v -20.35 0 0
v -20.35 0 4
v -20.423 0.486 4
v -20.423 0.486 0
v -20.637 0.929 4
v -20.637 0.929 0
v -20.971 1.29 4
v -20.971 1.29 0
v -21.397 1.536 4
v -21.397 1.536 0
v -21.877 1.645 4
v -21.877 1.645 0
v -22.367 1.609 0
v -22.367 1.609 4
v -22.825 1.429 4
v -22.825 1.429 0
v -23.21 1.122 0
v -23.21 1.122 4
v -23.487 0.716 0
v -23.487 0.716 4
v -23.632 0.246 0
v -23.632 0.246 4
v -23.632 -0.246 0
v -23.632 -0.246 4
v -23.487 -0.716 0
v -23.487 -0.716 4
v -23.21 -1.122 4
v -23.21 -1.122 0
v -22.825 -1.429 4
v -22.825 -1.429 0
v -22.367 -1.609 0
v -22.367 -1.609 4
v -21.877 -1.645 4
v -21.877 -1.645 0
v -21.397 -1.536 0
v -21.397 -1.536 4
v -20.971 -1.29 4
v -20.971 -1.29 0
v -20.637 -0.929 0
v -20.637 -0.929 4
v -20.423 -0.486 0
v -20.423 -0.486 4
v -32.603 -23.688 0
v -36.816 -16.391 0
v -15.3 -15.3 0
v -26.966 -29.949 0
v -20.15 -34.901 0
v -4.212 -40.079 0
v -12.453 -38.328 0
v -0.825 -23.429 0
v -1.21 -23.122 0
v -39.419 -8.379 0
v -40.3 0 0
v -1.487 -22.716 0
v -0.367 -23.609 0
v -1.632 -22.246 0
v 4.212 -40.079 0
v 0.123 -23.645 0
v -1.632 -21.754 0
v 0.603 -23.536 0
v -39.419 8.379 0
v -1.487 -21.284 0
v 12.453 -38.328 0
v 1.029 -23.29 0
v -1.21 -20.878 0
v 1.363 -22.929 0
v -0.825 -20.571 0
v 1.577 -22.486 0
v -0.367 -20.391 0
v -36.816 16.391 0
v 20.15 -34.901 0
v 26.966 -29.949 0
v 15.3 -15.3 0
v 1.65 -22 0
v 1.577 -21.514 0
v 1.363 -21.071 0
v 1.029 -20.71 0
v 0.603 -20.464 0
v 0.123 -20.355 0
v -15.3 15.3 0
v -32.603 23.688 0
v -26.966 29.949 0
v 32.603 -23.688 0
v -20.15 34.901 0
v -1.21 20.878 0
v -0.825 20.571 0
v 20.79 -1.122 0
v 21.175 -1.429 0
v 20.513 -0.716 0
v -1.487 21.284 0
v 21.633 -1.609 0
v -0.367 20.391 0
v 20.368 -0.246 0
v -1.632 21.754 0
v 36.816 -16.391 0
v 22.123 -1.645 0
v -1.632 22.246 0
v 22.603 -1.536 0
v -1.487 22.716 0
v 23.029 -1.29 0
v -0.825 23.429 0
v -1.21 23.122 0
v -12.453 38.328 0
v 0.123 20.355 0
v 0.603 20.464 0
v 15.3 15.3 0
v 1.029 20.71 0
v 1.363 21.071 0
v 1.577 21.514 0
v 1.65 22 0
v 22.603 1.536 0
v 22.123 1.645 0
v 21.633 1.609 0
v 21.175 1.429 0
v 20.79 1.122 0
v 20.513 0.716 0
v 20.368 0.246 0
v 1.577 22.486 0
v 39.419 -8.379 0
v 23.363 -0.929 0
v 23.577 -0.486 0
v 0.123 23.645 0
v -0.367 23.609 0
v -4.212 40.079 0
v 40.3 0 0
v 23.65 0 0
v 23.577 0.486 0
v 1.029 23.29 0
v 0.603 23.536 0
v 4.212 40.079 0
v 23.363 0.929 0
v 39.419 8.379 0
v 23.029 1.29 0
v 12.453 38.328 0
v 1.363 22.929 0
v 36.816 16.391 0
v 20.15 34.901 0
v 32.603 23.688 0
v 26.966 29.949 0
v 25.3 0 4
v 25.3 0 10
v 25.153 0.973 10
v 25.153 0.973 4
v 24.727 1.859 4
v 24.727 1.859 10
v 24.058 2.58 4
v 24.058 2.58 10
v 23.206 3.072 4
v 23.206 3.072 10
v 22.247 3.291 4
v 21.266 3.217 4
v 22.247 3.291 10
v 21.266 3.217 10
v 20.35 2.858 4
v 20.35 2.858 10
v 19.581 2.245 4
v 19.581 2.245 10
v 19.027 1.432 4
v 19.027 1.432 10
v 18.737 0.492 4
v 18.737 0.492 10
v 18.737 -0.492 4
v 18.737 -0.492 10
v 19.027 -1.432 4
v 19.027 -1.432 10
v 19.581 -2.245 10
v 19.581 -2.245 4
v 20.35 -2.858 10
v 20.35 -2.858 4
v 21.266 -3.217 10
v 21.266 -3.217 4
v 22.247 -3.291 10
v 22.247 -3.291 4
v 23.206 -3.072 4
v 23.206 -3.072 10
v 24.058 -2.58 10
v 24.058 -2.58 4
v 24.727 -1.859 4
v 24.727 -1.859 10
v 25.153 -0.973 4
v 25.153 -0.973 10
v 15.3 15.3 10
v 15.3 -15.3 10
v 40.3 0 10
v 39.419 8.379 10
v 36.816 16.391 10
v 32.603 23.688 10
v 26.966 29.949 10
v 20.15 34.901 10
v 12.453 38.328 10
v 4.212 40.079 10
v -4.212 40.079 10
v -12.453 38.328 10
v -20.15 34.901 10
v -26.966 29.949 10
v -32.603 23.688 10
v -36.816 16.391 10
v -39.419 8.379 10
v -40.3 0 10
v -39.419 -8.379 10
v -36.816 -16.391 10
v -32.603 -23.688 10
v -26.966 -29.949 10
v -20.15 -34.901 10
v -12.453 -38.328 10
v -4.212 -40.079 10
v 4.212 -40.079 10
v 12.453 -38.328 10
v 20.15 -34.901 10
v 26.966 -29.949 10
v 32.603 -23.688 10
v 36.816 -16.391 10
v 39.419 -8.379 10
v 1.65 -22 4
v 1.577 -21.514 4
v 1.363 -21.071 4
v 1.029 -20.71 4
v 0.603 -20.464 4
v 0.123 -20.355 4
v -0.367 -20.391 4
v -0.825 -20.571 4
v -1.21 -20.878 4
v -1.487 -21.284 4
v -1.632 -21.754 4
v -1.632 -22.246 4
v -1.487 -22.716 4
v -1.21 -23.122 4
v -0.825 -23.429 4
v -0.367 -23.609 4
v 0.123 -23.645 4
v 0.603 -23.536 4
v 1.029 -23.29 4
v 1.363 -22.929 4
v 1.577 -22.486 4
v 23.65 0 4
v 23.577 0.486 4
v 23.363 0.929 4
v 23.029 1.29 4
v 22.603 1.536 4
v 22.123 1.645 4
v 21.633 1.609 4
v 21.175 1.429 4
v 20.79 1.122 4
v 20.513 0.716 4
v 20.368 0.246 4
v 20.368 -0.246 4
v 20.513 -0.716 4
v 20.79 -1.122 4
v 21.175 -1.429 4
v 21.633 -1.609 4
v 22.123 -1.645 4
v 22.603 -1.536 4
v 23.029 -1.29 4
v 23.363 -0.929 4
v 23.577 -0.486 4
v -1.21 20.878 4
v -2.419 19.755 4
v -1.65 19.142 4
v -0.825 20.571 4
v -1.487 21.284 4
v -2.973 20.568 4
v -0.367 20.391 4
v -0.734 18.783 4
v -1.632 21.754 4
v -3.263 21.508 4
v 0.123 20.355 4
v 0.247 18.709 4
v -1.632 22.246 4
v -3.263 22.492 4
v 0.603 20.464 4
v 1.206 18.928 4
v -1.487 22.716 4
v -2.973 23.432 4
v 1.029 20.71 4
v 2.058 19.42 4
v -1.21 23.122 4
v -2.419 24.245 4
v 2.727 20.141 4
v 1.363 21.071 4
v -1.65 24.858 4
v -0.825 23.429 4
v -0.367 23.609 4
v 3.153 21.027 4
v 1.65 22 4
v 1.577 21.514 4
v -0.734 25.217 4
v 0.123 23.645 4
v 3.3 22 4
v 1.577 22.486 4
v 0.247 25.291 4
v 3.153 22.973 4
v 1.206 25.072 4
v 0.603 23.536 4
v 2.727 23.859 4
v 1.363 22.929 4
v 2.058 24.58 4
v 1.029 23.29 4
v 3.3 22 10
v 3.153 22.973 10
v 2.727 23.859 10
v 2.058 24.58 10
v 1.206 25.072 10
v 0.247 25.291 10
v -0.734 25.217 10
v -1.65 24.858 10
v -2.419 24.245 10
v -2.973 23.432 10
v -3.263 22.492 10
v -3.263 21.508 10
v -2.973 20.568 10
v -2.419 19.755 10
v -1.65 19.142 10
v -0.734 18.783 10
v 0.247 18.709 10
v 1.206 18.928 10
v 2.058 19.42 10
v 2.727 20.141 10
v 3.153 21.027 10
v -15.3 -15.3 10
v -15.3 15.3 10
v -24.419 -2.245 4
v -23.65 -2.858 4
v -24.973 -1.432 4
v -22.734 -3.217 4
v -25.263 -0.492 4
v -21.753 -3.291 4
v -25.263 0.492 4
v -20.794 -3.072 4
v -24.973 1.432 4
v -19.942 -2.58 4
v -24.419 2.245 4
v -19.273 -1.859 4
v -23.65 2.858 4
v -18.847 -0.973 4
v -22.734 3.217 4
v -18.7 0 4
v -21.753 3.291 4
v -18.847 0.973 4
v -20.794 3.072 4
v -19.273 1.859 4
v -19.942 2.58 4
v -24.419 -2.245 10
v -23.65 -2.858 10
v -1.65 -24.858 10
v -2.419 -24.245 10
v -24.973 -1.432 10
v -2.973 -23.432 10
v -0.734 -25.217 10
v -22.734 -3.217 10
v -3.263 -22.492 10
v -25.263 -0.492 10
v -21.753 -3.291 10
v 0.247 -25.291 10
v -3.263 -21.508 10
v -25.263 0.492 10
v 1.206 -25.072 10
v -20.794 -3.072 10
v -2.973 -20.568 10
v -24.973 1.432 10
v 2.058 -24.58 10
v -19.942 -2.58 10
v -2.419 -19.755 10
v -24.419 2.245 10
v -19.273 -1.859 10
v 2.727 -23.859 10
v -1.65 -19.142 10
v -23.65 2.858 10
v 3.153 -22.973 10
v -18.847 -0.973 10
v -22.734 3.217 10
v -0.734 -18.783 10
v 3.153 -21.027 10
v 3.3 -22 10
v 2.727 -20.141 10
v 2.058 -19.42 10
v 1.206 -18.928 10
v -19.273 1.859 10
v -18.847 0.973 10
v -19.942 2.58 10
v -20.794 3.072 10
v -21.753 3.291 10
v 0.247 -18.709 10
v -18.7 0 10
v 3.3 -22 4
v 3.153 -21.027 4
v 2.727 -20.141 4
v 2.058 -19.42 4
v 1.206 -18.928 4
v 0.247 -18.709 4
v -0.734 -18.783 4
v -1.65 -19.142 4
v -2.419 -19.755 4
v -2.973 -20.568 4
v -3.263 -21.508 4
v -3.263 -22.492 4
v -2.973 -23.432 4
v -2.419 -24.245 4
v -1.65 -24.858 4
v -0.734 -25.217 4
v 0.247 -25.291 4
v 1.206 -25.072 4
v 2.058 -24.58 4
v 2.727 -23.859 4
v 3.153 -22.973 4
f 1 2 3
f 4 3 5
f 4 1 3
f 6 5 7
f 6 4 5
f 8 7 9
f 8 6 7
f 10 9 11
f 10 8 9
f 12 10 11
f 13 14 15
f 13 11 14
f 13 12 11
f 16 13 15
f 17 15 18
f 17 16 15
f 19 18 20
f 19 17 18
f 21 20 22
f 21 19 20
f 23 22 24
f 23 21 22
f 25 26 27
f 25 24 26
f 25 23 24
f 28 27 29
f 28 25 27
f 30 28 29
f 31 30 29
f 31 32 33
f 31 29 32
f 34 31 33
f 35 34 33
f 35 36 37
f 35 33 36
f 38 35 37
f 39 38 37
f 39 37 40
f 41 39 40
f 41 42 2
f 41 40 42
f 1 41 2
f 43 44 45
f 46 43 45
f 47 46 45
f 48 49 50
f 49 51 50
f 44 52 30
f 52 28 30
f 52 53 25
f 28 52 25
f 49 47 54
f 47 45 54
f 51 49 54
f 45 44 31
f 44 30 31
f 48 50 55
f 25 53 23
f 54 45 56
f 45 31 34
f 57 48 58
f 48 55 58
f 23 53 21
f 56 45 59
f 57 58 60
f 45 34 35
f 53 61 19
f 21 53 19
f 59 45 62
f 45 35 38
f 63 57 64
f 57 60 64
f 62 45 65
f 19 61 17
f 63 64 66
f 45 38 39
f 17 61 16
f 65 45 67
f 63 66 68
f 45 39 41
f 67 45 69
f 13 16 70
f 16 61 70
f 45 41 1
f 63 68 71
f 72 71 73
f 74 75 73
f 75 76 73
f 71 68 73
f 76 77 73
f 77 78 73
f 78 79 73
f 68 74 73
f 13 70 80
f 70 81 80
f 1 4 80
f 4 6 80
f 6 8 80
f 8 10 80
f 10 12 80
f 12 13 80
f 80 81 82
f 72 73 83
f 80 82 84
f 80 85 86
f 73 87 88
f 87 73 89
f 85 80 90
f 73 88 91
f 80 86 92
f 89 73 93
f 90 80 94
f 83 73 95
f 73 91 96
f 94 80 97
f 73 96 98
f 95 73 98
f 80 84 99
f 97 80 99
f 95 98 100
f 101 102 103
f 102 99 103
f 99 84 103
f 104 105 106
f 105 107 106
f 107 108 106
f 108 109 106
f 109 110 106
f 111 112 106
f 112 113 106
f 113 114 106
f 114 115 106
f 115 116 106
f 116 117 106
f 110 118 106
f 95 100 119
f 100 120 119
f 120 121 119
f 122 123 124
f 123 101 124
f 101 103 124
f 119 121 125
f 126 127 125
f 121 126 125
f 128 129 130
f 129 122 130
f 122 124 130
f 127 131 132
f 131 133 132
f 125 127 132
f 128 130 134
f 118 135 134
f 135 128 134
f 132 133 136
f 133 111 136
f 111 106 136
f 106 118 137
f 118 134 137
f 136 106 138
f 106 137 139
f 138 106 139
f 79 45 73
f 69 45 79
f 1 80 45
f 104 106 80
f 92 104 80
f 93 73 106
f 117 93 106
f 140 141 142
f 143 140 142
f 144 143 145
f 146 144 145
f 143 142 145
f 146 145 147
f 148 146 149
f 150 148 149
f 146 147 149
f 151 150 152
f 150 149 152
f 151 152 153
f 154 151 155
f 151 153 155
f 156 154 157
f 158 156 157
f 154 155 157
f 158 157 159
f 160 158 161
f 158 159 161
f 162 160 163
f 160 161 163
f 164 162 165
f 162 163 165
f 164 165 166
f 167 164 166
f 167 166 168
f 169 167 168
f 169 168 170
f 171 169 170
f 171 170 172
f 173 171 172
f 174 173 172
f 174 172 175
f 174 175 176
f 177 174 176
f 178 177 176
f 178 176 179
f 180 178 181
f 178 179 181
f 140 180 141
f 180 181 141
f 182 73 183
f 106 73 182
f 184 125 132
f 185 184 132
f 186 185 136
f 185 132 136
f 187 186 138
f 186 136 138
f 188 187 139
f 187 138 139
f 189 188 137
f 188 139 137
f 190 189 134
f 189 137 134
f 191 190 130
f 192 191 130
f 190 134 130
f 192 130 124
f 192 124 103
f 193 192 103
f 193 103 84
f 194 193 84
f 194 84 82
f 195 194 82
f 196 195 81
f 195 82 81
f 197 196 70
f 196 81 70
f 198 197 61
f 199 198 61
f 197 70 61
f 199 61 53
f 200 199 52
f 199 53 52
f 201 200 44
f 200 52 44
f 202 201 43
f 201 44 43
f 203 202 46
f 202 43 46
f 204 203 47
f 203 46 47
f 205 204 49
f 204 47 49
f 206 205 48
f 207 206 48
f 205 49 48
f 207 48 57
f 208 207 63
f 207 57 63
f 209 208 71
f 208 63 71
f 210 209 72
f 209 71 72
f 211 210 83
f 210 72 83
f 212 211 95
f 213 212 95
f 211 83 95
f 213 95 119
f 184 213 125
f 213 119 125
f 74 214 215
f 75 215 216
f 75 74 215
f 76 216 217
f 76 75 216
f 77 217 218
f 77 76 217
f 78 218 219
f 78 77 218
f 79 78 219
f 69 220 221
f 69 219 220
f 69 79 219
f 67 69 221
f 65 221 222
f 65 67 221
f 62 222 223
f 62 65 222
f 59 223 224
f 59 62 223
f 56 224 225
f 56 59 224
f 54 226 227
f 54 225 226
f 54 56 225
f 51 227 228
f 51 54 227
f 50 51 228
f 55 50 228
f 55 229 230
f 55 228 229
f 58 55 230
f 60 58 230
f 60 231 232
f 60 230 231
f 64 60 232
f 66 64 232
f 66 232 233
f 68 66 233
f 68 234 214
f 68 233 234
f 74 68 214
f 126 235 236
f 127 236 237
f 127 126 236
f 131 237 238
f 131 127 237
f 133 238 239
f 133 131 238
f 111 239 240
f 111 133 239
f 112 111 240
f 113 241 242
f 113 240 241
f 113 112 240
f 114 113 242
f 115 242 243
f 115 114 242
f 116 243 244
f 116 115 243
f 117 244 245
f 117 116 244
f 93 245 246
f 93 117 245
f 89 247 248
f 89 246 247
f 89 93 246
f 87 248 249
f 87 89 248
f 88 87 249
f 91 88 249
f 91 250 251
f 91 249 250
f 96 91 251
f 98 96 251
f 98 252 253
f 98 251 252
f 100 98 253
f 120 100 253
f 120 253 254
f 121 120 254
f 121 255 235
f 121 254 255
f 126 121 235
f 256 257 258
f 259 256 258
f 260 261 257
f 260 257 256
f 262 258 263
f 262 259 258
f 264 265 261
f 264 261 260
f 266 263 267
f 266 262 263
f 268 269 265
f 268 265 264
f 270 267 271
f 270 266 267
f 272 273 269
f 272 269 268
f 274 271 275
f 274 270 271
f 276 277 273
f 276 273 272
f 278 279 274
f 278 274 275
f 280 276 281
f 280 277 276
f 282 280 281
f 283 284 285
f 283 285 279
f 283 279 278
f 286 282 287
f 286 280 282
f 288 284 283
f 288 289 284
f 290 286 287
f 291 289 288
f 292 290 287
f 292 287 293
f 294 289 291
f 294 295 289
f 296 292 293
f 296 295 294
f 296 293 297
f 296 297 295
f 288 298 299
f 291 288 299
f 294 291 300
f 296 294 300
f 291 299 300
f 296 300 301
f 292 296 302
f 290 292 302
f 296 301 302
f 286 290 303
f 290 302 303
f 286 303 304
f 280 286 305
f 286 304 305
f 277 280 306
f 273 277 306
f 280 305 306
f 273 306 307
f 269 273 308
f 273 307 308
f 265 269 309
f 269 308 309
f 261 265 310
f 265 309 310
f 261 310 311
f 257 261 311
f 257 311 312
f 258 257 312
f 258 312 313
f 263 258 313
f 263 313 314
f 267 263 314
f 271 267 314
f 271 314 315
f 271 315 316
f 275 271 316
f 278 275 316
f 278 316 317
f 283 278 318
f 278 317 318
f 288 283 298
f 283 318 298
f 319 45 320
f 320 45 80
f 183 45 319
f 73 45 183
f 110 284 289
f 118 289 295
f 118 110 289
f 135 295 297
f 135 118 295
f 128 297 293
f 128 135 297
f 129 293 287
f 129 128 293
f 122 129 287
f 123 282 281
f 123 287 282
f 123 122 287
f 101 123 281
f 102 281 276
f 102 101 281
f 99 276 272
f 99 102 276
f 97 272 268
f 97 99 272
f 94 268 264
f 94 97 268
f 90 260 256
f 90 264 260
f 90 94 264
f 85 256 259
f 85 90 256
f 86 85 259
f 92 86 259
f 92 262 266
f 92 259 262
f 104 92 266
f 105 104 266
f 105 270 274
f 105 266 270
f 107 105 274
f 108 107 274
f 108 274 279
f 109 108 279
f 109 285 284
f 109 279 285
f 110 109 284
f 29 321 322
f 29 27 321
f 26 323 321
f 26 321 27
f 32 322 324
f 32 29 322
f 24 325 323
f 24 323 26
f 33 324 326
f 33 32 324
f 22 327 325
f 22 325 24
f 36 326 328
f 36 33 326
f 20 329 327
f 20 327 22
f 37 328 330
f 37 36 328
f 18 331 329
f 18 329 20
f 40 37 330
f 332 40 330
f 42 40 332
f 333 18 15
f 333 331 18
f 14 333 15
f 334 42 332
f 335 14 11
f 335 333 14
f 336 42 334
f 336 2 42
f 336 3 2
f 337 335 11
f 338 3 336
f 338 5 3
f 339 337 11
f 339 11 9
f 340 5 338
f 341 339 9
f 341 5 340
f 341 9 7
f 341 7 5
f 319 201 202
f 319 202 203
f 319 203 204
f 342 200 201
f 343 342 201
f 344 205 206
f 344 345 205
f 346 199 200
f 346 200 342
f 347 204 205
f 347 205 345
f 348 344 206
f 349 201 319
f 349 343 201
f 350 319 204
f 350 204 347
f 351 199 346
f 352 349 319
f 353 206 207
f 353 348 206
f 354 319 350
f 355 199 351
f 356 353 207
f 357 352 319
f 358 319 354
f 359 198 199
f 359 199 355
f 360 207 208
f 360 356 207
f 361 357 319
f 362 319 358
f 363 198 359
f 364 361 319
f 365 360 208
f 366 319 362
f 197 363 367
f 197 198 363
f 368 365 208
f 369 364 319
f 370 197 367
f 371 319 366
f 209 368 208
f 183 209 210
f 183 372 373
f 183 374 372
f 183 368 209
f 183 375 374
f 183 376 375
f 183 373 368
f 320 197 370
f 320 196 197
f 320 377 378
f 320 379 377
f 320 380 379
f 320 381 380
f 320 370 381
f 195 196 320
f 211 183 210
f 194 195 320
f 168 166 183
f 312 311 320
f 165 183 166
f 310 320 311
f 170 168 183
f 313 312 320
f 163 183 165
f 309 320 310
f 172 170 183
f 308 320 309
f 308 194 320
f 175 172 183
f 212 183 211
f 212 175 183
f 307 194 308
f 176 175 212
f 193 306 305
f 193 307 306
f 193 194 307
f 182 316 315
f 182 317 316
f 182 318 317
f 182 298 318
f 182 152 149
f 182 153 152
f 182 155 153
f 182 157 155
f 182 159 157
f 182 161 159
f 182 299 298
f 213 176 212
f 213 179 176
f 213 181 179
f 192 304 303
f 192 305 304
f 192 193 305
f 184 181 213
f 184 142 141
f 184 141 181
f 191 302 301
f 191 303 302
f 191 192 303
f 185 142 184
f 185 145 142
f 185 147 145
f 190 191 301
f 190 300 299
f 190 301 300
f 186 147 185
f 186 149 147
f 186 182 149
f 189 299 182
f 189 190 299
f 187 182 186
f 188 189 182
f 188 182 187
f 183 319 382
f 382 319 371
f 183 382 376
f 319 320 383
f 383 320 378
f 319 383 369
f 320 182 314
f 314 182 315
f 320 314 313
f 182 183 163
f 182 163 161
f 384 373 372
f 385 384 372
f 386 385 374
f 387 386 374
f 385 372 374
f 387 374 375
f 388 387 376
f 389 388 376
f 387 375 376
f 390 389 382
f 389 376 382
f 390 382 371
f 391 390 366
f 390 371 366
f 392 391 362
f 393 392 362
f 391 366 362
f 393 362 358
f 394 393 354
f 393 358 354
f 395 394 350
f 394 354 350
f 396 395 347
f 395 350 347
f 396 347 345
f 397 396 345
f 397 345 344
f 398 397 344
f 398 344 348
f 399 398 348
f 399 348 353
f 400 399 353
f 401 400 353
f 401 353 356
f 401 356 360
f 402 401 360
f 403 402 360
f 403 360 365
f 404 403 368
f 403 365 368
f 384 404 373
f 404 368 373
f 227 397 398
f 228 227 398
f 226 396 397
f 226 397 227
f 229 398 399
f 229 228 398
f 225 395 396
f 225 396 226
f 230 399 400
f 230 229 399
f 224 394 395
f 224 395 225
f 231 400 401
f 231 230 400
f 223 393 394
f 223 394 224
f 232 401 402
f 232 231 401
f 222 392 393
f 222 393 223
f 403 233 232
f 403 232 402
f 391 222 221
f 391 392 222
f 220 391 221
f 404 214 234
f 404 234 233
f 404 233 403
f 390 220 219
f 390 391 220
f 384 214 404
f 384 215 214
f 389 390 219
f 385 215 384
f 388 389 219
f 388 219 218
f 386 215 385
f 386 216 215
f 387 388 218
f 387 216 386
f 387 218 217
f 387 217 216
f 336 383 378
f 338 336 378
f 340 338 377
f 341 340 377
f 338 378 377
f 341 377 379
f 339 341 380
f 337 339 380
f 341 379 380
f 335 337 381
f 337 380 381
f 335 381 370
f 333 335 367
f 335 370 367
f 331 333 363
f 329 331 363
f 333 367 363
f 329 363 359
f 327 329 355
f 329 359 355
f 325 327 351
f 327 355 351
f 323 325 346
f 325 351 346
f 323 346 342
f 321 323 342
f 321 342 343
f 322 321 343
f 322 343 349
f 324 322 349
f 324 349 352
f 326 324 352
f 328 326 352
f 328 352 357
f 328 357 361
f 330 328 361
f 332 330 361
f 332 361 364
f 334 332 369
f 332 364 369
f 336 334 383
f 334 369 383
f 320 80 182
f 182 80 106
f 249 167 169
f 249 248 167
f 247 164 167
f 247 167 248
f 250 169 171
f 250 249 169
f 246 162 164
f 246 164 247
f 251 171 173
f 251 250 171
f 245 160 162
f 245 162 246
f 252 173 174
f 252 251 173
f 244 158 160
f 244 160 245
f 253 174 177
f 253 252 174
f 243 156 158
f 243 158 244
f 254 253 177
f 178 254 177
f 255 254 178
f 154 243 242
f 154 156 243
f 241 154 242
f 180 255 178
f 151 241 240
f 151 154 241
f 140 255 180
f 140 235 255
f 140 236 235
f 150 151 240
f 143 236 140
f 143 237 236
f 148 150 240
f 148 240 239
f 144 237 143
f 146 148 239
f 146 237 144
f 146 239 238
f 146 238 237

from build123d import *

# Parameters (mm, degrees)
SKETCH1_R           = 40.3
SKETCH1_R_2         = 1.65
SKETCH1_W           = 30.6
SKETCH1_H           = 30.6
BOSS_EXTRUDE1_DEPTH = 10
SKETCH2_R           = 3.3
CUT_EXTRUDE1_DEPTH  = 6


with BuildPart() as part:
    # Sketch1 → Boss-Extrude1 (new body)
    with BuildSketch(Plane.XY):
        Circle(SKETCH1_R)
        with Locations((0, 22)):
            Circle(SKETCH1_R_2, mode=Mode.SUBTRACT)
        with Locations((22, 0)):
            Circle(SKETCH1_R_2, mode=Mode.SUBTRACT)
        with Locations((0, -22)):
            Circle(SKETCH1_R_2, mode=Mode.SUBTRACT)
        with Locations((-22, 0)):
            Circle(SKETCH1_R_2, mode=Mode.SUBTRACT)
        Rectangle(SKETCH1_W, SKETCH1_H, mode=Mode.SUBTRACT)
    extrude(amount=BOSS_EXTRUDE1_DEPTH)

    # Sketch2 → Cut-Extrude1 (cut)
    with BuildSketch(Plane.XY.offset(10)):
        with Locations((22, 0)):
            Circle(SKETCH2_R)
        with Locations((0, 22)):
            Circle(SKETCH2_R)
        with Locations((-22, 0)):
            Circle(SKETCH2_R)
        with Locations((0, -22)):
            Circle(SKETCH2_R)
    extrude(amount=-CUT_EXTRUDE1_DEPTH, mode=Mode.SUBTRACT)


solid = part.part
